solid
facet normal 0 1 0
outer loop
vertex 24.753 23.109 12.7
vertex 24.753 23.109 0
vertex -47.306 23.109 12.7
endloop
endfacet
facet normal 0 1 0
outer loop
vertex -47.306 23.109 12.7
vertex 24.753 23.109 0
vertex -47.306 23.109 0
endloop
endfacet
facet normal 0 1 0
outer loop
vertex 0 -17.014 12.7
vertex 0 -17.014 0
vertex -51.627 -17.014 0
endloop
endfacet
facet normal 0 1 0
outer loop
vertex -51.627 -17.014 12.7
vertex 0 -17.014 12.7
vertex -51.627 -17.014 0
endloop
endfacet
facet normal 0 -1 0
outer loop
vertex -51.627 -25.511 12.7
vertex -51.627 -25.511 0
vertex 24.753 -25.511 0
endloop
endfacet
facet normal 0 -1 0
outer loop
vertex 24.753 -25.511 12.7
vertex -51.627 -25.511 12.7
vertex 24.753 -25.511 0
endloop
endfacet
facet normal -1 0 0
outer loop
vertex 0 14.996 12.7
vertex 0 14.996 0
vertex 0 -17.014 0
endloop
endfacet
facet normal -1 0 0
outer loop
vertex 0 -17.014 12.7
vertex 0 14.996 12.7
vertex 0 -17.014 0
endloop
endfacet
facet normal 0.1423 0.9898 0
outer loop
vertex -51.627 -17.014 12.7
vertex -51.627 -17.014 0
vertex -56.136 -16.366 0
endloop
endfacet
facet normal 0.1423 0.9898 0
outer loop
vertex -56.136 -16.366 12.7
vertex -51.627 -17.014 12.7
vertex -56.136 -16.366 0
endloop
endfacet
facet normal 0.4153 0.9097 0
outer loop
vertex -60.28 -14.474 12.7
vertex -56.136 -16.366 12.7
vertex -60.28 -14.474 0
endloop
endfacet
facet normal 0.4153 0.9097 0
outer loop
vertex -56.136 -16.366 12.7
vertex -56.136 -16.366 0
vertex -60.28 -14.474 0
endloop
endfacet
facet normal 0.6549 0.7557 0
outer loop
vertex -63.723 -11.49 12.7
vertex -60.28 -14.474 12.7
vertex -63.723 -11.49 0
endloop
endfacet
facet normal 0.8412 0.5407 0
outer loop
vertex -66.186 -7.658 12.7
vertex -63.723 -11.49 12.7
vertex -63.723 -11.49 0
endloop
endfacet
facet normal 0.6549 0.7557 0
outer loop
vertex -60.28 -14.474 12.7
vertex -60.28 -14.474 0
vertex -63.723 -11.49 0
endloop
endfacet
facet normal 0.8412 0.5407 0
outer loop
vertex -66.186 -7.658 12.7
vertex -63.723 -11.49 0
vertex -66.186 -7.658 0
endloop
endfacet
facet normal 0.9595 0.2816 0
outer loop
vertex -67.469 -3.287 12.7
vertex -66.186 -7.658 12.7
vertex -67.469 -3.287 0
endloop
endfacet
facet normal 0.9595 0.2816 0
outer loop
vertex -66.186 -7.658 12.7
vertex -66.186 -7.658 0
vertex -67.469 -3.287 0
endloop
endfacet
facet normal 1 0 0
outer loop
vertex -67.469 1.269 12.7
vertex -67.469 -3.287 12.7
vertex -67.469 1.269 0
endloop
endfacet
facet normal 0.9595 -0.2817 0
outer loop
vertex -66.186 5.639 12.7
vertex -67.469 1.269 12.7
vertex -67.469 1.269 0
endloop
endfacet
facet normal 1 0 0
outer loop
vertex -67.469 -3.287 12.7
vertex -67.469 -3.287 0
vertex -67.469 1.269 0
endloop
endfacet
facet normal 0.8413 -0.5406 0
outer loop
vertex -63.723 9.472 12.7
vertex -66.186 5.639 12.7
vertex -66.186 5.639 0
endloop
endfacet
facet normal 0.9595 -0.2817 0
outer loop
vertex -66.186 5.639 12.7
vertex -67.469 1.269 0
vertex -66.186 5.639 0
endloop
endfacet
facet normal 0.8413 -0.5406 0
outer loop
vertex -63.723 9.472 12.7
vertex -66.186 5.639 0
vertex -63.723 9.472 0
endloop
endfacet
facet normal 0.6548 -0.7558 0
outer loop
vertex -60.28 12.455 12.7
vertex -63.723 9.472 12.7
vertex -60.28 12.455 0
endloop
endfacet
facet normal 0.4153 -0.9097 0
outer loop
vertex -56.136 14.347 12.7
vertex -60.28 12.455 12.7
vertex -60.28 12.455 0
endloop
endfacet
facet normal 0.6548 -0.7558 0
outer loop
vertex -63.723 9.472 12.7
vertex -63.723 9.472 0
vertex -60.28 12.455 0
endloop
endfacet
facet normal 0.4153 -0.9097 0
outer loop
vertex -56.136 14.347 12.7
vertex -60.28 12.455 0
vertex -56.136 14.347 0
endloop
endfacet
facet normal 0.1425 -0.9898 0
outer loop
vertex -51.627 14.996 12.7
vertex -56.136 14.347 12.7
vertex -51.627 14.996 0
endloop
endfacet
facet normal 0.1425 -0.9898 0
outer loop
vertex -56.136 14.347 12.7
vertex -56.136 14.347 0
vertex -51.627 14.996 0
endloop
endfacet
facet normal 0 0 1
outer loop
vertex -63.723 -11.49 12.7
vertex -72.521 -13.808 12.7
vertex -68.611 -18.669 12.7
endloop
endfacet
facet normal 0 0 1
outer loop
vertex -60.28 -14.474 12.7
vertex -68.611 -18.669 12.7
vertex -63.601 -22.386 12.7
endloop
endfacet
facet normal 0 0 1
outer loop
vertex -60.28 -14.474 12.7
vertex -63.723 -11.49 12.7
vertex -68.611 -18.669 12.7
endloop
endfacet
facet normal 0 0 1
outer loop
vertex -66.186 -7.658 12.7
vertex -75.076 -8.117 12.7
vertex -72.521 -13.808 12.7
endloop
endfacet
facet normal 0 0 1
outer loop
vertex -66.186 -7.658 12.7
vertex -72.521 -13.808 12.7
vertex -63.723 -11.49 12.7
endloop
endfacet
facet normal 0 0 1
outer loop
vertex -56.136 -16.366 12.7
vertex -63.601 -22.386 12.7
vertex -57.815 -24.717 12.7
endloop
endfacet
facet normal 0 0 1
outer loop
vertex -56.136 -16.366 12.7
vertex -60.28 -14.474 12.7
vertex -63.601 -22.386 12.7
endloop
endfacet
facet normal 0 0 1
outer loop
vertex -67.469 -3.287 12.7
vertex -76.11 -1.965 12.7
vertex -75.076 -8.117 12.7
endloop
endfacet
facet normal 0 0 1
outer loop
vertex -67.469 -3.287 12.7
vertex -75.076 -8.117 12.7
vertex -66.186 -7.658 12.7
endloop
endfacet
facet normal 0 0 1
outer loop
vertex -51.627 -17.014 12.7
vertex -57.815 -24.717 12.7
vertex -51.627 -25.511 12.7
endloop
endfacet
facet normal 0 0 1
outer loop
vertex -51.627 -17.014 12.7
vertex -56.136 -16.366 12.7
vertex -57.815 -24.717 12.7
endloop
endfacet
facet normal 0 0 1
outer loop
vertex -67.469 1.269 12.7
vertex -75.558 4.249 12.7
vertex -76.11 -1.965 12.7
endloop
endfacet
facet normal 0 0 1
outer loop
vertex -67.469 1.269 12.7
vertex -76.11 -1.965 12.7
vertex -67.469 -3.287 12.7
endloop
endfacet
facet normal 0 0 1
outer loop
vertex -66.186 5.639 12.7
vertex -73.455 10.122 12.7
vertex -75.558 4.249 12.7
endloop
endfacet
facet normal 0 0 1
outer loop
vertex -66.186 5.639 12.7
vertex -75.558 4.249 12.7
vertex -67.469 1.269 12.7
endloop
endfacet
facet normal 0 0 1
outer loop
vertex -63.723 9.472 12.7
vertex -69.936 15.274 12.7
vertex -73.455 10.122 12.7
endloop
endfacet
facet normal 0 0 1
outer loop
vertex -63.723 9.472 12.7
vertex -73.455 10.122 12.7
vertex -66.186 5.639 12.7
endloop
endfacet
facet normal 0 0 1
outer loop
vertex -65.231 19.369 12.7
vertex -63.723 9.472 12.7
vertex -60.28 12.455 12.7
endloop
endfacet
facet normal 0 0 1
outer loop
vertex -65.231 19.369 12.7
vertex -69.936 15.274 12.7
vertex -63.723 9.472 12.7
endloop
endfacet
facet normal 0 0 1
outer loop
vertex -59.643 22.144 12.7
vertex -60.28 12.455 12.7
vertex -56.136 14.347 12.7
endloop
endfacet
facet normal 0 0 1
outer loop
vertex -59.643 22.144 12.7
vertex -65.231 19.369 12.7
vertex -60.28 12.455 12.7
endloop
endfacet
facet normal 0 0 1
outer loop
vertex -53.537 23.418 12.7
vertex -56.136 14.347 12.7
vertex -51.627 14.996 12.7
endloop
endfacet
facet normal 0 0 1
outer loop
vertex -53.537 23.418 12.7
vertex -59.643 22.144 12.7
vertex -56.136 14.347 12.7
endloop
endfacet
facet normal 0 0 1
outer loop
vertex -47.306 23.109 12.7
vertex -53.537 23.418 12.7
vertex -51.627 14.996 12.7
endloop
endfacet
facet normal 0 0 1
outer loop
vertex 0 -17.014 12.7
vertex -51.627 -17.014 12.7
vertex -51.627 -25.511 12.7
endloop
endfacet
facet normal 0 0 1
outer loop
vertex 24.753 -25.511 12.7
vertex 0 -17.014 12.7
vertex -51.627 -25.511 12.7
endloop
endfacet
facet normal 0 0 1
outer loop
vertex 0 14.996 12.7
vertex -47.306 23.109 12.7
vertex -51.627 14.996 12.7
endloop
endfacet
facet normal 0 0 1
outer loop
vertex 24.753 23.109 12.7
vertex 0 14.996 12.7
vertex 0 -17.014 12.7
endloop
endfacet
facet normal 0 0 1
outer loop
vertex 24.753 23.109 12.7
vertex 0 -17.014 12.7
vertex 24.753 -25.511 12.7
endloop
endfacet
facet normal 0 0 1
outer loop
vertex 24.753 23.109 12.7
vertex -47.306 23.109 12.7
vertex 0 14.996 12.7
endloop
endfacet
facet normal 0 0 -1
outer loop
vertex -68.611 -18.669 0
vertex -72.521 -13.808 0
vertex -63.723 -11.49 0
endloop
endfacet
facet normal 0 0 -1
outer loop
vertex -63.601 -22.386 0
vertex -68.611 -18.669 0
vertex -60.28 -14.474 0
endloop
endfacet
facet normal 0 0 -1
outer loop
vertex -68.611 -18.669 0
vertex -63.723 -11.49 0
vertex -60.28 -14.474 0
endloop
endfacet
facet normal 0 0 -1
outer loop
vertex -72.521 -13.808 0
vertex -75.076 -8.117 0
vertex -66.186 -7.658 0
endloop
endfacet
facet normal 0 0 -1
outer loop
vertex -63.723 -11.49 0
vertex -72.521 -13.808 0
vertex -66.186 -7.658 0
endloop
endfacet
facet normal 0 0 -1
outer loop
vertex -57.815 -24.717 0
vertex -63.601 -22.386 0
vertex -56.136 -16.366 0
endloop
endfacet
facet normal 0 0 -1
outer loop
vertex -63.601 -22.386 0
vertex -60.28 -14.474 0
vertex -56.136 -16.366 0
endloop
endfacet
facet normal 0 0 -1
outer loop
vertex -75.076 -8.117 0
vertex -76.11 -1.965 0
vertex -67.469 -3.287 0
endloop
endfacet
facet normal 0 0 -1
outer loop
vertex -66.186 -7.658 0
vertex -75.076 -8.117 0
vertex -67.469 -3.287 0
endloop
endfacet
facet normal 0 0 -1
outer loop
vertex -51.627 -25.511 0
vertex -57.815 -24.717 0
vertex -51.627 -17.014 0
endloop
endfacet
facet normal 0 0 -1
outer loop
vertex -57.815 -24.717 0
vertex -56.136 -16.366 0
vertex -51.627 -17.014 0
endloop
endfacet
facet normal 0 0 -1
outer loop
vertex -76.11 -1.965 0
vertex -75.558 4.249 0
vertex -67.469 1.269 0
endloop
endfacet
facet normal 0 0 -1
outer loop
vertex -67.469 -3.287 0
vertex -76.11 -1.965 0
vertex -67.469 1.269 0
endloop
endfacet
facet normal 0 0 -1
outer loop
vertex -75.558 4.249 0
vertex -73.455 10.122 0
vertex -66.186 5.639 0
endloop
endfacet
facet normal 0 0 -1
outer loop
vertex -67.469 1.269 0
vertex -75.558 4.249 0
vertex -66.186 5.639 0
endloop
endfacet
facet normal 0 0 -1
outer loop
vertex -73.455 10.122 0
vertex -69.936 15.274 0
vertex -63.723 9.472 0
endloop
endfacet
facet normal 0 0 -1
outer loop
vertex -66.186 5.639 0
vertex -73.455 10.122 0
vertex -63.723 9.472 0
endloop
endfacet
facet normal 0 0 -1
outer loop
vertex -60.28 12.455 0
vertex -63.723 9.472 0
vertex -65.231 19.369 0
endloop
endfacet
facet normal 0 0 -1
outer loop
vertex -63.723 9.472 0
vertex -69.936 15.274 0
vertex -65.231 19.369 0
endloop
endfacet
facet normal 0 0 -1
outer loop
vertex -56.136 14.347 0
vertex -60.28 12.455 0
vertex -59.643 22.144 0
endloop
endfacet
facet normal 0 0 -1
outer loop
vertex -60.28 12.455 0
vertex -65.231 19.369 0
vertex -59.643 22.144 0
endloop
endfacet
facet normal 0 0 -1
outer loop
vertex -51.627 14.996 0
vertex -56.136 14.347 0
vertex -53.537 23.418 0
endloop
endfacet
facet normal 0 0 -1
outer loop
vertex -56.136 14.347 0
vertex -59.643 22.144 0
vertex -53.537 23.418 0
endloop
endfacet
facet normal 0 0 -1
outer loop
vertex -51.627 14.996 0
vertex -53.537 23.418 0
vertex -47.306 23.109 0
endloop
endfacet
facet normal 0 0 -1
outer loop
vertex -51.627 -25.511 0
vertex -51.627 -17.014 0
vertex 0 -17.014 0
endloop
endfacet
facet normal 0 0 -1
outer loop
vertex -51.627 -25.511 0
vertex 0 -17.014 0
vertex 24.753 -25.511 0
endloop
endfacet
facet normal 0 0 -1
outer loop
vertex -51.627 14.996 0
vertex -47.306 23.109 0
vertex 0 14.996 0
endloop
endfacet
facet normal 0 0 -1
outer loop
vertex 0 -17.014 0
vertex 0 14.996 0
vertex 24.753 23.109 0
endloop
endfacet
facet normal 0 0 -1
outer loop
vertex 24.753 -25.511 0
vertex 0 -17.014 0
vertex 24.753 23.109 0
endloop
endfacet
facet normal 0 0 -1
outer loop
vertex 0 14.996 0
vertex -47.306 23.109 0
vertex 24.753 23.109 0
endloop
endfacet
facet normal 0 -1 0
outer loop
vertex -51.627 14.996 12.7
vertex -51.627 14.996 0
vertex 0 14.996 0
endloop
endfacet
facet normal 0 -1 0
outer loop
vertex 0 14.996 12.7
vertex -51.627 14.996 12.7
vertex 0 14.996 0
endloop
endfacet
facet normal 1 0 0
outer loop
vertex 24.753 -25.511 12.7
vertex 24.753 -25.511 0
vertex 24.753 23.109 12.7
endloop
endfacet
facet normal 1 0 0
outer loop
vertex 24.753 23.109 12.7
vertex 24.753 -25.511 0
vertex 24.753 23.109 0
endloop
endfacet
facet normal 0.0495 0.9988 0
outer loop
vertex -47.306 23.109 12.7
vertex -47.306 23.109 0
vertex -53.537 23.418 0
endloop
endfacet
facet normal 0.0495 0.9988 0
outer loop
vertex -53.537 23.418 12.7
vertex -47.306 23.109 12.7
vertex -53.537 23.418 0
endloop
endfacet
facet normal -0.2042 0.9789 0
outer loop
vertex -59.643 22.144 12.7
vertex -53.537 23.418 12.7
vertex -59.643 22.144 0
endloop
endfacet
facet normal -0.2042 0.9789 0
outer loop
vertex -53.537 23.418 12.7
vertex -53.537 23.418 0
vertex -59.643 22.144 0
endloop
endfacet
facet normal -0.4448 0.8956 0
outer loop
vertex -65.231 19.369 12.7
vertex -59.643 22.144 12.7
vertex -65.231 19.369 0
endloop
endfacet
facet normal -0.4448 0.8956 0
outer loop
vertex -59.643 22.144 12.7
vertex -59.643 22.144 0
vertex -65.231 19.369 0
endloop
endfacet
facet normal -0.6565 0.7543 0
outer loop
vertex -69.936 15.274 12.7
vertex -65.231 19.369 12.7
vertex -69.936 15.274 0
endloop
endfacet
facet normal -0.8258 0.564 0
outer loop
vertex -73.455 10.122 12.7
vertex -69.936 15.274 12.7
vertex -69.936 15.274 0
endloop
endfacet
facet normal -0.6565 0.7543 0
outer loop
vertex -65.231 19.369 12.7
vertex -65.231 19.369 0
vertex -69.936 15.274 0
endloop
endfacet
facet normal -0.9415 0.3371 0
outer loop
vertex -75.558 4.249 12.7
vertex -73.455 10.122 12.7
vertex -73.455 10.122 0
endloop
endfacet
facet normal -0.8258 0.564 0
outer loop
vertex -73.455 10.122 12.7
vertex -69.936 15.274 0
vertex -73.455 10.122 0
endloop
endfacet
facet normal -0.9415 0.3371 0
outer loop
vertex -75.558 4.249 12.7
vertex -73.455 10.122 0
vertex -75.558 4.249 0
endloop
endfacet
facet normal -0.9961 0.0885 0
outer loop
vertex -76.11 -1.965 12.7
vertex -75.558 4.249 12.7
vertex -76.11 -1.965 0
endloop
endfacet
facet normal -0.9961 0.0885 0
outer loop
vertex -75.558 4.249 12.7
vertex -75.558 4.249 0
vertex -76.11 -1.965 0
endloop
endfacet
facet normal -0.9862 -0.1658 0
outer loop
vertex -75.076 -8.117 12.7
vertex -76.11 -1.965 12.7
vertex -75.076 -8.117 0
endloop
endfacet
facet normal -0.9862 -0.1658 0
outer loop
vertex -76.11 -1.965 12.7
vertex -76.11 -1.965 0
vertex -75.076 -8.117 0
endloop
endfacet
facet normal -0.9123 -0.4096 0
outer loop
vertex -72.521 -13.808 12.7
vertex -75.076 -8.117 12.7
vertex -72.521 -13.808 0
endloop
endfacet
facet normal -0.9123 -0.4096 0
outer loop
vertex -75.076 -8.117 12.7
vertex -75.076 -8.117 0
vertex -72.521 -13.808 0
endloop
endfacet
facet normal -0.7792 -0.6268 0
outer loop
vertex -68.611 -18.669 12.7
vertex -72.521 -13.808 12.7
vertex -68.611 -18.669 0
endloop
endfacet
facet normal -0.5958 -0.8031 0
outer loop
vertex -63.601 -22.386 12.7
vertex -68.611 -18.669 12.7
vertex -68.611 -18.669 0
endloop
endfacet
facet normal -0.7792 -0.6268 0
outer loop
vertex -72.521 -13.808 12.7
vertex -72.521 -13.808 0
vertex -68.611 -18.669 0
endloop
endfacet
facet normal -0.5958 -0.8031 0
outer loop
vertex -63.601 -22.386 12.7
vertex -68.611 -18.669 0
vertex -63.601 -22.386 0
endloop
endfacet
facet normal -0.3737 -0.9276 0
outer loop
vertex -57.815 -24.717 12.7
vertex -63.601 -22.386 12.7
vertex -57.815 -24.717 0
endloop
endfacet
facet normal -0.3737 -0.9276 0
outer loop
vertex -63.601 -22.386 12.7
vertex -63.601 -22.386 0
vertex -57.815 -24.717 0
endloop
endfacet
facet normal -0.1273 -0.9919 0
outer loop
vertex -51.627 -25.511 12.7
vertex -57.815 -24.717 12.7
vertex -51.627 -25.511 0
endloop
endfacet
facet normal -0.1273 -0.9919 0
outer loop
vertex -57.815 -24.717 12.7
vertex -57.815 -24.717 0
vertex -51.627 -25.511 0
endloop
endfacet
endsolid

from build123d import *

# Parameters (mm, degrees)
F1_DEPTH = 12.7


with BuildPart() as f1:
    # F0 (on Top) → F1 (new body)
    with BuildSketch(Plane.XY):
        with BuildLine():
            ThreePointArc((-47.3058475157, 23.1087561697), (-76.0328855481, 1.1598869775), (-51.6270473599, -25.511270389))
            Line((-51.6270473599, -25.511270389), (-51.6270473599, -17.0142557472))
            ThreePointArc((-51.6270473599, -17.0142557472), (-67.6320735365, -1.0092295706), (-51.6270473599, 14.9957966059))
            Line((-51.6270473599, 14.9957966059), (-51.6270473599, 23.1087561697))
            Line((-51.6270473599, 23.1087561697), (-47.3058475157, 23.1087561697))
        make_face()
        with BuildLine():
            ThreePointArc((-33.0747121606, -17.0142557472), (-41.4242487344, -23.2859641713), (-51.6270473599, -25.511270389))
            Line((-51.6270473599, -25.511270389), (24.7534979135, -25.511270389))
            Line((24.7534979135, -25.511270389), (24.7534979135, 23.1087561697))
            Line((24.7534979135, 23.1087561697), (-47.3058475157, 23.1087561697))
            ThreePointArc((-47.3058475157, 23.1087561697), (-39.4921934437, 20.2768063378), (-33.0747121606, 14.9957966059))
            Line((-33.0747121606, 14.9957966059), (0, 14.9957966059))
            Line((0, 14.9957966059), (0, -17.0142557472))
            Line((0, -17.0142557472), (-33.0747121606, -17.0142557472))
        make_face()
        with BuildLine():
            Line((-51.6270473599, -17.0142557472), (-51.6270473599, -25.511270389))
            ThreePointArc((-51.6270473599, -25.511270389), (-41.4242487344, -23.2859641713), (-33.0747121606, -17.0142557472))
            Line((-33.0747121606, -17.0142557472), (-51.6270473599, -17.0142557472))
        make_face()
        with BuildLine():
            ThreePointArc((-33.0747121606, 14.9957966059), (-39.4921934437, 20.2768063378), (-47.3058475157, 23.1087561697))
            Line((-47.3058475157, 23.1087561697), (-51.6270473599, 23.1087561697))
            Line((-51.6270473599, 23.1087561697), (-51.6270473599, 14.9957966059))
            Line((-51.6270473599, 14.9957966059), (-33.0747121606, 14.9957966059))
        make_face()
    extrude(amount=F1_DEPTH)


solid = f1.part
